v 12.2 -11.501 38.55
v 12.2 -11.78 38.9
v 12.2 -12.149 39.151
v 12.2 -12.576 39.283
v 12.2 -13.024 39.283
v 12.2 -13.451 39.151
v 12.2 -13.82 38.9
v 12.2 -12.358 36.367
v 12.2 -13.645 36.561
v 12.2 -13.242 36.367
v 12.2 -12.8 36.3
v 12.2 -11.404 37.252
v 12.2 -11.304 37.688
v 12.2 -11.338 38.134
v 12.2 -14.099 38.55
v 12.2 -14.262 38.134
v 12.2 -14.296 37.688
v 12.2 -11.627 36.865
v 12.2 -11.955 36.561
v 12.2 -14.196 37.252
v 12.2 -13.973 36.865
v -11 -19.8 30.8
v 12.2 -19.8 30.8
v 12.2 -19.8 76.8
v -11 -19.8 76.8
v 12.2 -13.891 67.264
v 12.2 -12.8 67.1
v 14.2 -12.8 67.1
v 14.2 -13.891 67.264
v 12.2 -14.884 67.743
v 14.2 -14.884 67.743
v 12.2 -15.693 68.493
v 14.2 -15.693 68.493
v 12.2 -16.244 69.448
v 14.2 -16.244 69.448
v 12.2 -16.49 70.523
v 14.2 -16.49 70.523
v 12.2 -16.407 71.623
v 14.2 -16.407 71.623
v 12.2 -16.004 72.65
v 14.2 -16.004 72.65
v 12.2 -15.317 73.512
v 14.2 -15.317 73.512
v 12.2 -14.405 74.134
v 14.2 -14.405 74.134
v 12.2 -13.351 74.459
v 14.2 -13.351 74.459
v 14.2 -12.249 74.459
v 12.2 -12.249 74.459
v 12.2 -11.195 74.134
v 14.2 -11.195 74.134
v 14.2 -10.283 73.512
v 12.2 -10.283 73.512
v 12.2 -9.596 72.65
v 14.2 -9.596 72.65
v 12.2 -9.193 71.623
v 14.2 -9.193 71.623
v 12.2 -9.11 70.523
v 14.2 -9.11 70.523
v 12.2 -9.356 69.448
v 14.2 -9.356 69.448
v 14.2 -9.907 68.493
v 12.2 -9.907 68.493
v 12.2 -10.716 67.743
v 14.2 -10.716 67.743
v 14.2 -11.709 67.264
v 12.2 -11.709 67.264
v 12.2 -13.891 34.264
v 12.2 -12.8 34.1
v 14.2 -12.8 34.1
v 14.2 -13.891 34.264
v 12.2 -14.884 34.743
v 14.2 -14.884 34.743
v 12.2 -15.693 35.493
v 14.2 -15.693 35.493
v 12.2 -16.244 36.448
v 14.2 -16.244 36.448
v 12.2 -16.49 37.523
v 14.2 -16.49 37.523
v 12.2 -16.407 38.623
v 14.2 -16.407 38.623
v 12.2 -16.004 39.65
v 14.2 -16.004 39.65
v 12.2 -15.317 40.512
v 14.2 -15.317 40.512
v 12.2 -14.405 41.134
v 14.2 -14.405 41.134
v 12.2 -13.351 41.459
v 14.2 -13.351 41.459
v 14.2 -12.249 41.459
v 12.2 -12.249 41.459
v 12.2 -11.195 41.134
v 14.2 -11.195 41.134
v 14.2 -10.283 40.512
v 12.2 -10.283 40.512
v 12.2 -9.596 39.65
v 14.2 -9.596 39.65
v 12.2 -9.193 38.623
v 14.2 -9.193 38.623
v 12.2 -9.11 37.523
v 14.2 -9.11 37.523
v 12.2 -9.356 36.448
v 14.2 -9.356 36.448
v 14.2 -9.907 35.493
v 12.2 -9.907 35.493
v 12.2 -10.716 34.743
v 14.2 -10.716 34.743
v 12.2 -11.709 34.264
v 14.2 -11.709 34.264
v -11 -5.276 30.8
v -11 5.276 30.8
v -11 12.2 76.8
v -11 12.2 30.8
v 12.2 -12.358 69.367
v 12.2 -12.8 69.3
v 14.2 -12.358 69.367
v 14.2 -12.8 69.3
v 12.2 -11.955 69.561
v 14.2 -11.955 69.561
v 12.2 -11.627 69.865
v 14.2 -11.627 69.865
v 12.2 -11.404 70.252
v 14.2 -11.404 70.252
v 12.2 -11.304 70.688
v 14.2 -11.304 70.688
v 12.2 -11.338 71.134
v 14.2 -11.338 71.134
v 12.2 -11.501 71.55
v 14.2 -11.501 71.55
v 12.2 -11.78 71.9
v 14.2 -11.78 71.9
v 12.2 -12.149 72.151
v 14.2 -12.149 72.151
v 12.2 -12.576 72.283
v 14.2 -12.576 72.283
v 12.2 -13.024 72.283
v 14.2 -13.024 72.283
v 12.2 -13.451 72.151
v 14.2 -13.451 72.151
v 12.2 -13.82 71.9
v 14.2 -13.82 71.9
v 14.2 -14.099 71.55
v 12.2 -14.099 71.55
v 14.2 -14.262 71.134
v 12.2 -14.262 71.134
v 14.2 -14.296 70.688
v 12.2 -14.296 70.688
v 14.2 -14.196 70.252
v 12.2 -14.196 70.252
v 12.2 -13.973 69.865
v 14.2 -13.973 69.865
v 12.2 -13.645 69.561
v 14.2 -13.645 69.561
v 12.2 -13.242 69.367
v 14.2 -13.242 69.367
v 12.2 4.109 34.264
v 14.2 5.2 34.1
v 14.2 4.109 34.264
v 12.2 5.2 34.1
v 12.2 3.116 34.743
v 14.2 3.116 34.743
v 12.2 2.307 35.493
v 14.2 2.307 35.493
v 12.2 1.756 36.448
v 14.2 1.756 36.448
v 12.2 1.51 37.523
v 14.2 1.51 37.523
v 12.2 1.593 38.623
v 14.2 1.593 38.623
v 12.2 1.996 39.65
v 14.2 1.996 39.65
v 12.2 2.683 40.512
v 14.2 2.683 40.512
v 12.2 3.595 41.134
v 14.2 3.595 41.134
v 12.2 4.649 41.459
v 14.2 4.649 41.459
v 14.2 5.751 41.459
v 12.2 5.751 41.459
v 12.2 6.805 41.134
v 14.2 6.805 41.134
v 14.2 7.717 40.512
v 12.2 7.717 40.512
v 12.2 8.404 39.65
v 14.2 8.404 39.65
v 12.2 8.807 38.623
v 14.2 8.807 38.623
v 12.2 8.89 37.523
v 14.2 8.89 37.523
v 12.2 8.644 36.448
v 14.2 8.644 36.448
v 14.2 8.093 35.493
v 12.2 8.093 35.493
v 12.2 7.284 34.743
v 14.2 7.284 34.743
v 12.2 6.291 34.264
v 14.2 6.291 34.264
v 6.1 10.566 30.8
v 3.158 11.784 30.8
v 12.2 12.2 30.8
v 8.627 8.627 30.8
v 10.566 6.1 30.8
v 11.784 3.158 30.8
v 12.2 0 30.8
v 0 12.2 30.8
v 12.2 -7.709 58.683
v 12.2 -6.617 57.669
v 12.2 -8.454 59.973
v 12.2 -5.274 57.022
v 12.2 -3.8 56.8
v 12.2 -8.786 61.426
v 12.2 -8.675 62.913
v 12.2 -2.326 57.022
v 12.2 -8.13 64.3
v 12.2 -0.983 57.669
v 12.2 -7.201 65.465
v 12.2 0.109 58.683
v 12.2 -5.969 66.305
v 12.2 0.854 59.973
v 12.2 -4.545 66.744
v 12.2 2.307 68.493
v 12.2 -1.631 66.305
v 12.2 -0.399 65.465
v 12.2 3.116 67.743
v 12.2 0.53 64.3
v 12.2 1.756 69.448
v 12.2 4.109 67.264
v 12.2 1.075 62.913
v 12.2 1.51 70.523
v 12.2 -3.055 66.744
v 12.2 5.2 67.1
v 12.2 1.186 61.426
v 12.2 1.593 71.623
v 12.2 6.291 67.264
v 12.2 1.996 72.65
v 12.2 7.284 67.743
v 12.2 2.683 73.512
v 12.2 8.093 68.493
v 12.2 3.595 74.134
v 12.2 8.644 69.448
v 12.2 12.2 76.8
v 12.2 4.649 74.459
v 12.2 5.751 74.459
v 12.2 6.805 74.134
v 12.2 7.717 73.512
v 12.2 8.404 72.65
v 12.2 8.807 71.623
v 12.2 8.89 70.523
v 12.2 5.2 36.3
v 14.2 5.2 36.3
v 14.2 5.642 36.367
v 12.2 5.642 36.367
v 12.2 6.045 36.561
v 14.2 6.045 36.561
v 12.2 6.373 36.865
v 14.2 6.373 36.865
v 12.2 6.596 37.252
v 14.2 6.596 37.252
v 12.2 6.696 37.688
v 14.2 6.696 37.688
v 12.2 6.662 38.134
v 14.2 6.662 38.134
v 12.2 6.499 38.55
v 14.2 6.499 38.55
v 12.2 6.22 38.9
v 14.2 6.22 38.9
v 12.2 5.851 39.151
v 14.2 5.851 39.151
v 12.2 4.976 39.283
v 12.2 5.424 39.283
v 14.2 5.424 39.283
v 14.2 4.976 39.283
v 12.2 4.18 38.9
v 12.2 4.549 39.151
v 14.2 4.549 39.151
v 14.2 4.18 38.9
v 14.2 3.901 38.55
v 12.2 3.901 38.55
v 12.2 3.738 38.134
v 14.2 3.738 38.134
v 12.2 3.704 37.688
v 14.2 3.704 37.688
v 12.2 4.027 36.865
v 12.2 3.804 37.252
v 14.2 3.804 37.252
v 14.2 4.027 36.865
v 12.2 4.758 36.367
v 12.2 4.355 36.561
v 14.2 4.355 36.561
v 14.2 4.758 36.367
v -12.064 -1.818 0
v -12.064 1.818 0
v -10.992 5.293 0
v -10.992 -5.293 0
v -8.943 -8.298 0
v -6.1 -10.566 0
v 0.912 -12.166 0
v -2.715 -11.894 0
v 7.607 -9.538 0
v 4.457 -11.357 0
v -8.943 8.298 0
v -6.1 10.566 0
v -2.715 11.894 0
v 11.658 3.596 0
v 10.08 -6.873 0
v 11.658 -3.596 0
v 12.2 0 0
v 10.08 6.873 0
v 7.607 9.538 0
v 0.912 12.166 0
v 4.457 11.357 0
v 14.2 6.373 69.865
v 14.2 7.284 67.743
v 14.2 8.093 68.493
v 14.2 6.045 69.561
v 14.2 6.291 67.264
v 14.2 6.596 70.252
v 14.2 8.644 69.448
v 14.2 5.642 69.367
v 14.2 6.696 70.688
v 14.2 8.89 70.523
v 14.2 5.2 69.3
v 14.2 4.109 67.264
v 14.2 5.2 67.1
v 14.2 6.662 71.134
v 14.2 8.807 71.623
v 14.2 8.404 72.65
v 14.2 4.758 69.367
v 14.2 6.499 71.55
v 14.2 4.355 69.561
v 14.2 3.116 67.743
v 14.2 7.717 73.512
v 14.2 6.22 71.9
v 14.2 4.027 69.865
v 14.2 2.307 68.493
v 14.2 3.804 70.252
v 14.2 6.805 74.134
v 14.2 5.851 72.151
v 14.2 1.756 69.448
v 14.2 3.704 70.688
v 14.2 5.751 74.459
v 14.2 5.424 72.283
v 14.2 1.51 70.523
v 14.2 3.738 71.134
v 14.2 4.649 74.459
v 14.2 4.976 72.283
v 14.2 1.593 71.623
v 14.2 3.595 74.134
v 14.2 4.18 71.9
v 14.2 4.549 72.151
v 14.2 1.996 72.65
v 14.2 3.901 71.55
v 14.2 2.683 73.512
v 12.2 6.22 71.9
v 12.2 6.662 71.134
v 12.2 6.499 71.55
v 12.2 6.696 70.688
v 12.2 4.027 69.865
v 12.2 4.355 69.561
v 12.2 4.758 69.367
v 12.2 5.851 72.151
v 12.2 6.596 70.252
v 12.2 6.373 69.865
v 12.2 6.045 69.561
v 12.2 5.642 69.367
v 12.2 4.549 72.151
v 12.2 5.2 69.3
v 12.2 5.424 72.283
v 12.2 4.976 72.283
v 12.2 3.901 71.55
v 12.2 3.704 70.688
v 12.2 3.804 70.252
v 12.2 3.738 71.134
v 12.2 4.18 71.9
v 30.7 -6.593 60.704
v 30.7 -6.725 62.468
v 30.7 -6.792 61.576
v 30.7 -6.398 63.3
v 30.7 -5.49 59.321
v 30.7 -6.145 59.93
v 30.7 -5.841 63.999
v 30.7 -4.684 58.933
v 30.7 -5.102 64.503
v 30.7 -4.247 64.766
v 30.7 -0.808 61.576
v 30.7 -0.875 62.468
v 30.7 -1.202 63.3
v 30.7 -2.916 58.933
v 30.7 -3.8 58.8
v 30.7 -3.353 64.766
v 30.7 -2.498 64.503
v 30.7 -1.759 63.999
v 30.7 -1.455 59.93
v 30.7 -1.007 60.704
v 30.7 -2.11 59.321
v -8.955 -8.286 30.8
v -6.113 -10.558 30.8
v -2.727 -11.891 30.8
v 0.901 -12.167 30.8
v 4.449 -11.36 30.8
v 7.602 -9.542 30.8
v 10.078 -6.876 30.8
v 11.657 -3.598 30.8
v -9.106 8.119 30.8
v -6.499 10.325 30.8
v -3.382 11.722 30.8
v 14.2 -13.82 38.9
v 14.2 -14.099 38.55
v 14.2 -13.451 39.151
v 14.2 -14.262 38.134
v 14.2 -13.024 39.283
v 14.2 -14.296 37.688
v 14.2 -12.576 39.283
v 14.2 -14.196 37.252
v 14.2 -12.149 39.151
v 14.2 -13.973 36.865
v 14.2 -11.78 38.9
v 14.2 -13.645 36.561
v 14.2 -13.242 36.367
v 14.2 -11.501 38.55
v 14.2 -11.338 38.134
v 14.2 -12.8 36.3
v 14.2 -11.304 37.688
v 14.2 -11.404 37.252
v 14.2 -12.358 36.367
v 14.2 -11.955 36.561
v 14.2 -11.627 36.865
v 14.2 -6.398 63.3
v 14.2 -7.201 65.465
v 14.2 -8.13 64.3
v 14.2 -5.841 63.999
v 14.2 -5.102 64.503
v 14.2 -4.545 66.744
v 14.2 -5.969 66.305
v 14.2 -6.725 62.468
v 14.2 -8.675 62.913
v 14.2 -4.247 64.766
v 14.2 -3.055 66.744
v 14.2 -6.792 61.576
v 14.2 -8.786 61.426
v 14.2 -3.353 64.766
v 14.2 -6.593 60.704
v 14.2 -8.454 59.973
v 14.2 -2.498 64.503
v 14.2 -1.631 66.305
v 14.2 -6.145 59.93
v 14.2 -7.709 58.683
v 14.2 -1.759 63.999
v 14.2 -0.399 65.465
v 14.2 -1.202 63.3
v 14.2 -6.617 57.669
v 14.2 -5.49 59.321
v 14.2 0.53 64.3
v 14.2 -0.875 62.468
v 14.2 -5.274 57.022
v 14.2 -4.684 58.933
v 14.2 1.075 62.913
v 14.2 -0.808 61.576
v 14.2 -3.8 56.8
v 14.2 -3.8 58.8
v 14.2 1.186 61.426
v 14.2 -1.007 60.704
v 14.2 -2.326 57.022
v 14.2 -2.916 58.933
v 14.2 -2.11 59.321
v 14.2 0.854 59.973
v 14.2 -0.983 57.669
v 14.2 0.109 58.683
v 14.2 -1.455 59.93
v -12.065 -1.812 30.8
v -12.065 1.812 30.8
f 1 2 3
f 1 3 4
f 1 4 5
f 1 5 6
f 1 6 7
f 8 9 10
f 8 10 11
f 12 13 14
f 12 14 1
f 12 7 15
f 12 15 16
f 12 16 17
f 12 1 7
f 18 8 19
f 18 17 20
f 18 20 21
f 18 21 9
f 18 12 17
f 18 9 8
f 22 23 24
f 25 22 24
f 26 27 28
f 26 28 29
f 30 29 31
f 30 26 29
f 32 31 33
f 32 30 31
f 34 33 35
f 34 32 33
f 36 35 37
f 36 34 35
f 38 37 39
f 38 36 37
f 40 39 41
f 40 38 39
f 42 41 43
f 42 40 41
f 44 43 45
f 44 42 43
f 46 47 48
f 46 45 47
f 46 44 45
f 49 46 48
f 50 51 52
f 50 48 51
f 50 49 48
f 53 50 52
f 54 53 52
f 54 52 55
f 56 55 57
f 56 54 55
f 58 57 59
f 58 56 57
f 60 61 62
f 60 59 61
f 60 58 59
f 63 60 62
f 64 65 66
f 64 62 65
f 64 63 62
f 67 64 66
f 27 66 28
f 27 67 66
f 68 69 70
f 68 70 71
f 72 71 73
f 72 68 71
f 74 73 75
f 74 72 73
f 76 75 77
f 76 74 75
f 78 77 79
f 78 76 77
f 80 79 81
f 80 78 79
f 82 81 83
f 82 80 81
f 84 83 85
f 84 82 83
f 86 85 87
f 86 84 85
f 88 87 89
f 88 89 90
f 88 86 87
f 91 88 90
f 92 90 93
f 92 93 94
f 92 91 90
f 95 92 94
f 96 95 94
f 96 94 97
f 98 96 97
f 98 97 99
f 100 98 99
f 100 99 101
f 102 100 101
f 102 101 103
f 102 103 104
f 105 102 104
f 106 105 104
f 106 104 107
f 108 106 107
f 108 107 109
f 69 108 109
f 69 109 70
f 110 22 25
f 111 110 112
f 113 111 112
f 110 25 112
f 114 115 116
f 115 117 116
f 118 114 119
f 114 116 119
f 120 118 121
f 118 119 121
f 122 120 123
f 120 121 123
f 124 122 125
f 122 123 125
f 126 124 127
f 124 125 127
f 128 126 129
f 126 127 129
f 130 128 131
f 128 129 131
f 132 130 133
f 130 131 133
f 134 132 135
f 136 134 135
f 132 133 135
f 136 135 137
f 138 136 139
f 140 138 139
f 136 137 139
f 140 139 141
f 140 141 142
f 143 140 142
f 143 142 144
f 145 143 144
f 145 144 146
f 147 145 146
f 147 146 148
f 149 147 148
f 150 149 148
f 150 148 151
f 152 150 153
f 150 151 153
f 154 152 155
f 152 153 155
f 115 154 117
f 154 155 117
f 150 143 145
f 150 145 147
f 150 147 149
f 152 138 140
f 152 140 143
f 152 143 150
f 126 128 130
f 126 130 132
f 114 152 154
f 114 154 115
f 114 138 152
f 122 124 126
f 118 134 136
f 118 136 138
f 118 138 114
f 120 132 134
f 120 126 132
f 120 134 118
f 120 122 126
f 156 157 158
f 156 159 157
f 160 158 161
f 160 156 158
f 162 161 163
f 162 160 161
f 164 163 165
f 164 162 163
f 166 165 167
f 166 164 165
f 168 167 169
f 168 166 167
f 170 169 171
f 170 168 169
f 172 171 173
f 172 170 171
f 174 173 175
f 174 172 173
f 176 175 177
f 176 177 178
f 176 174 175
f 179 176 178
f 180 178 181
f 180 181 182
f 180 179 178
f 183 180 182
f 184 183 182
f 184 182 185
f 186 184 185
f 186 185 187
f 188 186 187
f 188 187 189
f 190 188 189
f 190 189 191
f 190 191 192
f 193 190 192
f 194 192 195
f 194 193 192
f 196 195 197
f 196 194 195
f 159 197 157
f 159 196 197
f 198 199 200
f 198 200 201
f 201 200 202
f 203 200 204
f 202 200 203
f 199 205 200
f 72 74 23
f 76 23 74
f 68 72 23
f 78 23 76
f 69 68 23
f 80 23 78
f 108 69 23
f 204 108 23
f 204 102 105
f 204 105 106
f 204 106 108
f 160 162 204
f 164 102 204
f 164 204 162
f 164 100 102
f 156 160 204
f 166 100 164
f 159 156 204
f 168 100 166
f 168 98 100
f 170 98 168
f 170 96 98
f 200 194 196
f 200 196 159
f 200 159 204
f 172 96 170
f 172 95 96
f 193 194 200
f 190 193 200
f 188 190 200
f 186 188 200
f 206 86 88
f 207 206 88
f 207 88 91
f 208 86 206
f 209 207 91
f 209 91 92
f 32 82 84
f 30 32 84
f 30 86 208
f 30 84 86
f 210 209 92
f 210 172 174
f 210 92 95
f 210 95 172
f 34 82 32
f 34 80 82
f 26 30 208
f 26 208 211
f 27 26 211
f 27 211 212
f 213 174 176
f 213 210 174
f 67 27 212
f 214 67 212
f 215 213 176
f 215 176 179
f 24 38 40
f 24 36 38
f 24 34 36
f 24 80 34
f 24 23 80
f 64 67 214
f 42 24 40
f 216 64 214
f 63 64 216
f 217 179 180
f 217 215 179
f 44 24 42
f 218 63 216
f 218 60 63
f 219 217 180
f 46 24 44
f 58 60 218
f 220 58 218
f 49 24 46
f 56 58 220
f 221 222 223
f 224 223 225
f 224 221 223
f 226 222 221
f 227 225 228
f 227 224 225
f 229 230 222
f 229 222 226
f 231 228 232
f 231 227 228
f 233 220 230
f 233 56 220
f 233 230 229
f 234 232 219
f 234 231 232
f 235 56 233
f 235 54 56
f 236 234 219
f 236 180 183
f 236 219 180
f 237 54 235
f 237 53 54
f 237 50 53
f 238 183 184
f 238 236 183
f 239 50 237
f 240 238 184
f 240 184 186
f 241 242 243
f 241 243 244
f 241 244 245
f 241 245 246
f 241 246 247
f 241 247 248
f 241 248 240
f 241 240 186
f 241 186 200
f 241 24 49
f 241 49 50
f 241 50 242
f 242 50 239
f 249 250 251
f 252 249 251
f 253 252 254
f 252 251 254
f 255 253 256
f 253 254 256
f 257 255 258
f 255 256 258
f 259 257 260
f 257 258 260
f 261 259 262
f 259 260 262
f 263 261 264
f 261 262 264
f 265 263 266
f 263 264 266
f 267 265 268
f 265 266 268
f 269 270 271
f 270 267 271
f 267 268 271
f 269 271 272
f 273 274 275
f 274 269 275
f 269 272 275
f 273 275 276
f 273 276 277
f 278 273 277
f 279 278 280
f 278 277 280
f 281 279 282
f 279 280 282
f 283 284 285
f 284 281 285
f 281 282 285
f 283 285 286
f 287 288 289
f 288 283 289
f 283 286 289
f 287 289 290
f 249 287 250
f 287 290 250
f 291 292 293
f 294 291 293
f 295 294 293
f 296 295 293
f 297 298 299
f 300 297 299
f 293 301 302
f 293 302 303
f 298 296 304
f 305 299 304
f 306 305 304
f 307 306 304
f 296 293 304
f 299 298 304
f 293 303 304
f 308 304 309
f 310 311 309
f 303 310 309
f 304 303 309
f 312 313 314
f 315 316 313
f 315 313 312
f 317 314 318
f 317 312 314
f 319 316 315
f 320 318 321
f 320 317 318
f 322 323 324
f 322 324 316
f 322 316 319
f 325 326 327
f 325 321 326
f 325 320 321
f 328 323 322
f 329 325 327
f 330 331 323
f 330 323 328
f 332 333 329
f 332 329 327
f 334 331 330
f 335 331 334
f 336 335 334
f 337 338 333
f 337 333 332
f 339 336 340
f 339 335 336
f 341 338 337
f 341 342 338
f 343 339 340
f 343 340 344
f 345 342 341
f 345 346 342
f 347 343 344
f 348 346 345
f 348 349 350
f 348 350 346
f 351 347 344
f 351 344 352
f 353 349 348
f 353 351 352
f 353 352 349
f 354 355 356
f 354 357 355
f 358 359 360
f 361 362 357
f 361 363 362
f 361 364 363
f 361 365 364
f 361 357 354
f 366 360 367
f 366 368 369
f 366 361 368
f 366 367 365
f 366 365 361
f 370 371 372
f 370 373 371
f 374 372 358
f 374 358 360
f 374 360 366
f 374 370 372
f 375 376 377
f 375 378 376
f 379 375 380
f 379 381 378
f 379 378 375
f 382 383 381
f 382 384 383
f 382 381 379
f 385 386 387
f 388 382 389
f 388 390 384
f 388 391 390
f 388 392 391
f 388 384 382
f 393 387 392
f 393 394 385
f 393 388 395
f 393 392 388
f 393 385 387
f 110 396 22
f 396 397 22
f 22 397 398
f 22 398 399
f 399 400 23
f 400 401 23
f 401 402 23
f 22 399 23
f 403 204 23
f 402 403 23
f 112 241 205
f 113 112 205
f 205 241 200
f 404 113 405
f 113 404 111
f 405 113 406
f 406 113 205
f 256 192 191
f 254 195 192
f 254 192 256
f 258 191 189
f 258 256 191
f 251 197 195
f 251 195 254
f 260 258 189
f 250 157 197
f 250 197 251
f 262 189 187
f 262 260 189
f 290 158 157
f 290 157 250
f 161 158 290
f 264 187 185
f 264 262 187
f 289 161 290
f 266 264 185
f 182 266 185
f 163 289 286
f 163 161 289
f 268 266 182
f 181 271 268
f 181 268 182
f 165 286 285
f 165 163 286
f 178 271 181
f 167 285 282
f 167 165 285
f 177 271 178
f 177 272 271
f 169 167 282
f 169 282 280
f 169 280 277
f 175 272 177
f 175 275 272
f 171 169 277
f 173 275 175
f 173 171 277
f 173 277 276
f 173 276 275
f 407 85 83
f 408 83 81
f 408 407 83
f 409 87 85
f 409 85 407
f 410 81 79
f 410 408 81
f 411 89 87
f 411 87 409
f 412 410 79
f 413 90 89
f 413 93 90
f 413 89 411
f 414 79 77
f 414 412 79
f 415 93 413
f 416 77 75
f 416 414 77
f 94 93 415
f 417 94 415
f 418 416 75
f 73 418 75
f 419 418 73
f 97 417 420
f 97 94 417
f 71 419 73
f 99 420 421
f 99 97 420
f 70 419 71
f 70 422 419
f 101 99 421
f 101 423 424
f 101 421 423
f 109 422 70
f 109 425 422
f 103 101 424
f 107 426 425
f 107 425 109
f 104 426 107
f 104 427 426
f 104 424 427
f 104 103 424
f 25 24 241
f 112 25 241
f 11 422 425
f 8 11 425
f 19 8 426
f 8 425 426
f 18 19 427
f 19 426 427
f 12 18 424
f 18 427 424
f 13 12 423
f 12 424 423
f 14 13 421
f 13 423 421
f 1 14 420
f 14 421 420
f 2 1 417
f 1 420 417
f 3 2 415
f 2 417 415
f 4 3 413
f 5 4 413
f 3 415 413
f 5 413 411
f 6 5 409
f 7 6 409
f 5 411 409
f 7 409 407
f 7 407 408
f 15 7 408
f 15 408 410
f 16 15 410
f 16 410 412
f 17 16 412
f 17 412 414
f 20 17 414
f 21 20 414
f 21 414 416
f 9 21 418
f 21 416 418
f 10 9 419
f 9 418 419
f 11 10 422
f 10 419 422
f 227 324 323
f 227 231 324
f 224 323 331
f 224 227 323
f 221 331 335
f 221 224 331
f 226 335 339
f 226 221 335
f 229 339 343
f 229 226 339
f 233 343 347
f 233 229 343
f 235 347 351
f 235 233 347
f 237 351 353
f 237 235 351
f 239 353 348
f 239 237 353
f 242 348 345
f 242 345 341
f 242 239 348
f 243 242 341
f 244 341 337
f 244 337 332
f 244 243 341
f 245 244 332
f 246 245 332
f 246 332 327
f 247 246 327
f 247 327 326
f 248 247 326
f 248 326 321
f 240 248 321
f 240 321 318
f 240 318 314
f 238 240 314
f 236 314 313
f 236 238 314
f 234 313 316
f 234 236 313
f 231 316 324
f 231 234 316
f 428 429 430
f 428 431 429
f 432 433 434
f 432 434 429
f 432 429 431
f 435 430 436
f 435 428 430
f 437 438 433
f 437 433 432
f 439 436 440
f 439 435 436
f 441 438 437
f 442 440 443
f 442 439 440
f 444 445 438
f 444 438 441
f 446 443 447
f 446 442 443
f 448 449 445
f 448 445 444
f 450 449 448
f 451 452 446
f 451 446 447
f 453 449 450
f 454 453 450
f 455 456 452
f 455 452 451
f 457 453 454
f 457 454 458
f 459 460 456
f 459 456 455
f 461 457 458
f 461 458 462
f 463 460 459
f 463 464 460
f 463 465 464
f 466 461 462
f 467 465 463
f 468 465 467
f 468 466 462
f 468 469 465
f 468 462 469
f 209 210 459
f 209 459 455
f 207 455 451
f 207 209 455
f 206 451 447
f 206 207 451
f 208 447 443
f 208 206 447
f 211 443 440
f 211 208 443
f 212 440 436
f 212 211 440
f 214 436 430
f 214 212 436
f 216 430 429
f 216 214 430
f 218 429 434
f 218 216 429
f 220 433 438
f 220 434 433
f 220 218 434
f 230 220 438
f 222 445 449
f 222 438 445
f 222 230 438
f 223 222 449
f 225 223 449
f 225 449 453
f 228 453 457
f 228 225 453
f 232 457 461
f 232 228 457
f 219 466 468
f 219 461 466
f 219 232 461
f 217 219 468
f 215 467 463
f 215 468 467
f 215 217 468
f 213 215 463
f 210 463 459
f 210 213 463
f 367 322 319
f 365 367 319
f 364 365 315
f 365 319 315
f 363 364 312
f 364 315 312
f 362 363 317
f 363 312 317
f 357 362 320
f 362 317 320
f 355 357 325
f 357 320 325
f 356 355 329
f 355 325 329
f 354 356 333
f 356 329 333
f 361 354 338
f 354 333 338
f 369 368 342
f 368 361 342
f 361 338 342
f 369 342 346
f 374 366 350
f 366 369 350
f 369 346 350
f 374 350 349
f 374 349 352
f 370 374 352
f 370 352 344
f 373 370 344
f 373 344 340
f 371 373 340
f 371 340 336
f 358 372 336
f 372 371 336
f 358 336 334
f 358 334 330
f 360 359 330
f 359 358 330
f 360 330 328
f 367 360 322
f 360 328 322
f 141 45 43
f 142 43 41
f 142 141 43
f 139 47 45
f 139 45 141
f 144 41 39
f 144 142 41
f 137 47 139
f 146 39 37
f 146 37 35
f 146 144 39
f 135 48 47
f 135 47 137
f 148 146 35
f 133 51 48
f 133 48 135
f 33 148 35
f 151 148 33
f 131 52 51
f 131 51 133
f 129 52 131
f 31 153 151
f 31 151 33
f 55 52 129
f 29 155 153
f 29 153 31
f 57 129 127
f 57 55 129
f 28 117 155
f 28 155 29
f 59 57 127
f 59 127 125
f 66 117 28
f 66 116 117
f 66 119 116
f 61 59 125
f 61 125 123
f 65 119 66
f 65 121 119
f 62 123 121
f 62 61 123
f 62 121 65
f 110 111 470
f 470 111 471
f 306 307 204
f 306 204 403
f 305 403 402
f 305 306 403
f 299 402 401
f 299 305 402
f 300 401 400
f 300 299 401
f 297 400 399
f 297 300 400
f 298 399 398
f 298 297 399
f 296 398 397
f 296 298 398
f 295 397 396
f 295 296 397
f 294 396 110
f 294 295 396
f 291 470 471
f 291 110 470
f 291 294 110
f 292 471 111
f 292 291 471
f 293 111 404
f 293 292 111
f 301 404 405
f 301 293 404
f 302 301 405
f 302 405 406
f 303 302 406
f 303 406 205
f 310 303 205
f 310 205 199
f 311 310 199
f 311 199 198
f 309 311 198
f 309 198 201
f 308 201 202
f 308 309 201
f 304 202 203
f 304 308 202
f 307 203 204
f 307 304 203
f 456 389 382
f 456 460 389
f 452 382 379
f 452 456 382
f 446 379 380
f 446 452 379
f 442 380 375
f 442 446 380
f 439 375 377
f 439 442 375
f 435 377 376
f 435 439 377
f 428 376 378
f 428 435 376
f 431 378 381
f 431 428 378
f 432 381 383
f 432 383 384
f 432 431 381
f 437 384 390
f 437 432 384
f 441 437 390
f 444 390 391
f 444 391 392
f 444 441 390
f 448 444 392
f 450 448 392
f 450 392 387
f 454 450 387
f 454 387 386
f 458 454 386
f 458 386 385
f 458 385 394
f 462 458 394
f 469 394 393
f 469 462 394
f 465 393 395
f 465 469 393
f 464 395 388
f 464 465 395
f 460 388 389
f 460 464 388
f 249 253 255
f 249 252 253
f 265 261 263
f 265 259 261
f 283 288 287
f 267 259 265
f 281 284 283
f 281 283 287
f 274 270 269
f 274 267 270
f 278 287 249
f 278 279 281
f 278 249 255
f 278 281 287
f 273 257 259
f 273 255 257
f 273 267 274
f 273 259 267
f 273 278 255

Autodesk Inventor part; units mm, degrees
ref_plane "XZ Plane" through (0, 0, 0) normal (0, 1, 0) x (-1, 0, 0)
sketch "Эскиз1" plane through (0, 0, 0) normal (0, 0, 1) x (1, 0, 0)
  circle A0 centre (0, 0) radius 12.2
  dimension "d0" = 24.4
extrude "Выдавливание1" add sketch "Эскиз1" along normal blind 30.8
ref_plane "РабПлоскость1" through (12.2, 0, 0) normal (1, 0, 0) x (0, 1, 0)
sketch "Эскиз2" plane through (12.2, 0, 0) normal (1, 0, 0) x (0, 1, 0)
  line L0 (12.2, 0) -> (12.2, 30.8) projected
  line L1 (12.2, 30.8) -> (-19.8, 30.8)
  line L2 (-19.8, 30.8) -> (-19.8, 76.8)
  line L3 (-19.8, 76.8) -> (12.2, 76.8)
  line L4 (12.2, 76.8) -> (12.2, 30.8)
  point P0 (0, 0)
  dimension "d3" = 46
  dimension "d4" = 32
extrude "Выдавливание2" add sketch "Эскиз2" against normal blind 23.2
sketch "Эскиз3" plane through (12.2, 0, 0) normal (1, 0, 0) x (0, 0, -1)
  circle A0 centre (-70.8, -12.8) radius 3.7
  line L0 (0, 0) -> (0, -12.8)
  line L1 (0, -12.8) -> (-70.8, -12.8)
  point P0 (-76.8, -19.8)
  dimension "d10" = 7.4
  dimension "d11" = 12.8
  dimension "d12" = 70.8
extrude "Выдавливание3" add sketch "Эскиз3" along normal blind 2
ref_plane "РабПлоскость2" through (12.2, -3.8, 30.8) normal (0, -1, 0) x (1, 0, 0)
mirror "Зеркальное отражение1" about plane through (12.2, -3.8, 30.8) normal (0, -1, 0) of "Выдавливание3"
sketch "Эскиз4" plane through (12.2, 0, 0) normal (1, 0, 0) x (0, 0, -1)
  line L0 (-30.8, -5.2764) -> (-30.8, -19.8) projected
  line L1 (-30.8, -19.8) -> (-37.8, -19.8)
  line L2 (-30.8, -19.8) -> (-76.8, -19.8) projected
  line L3 (-37.8, -19.8) -> (-37.8, -12.8)
  circle A0 centre (-37.8, -12.8) radius 3.7
  point P0 (0, 0)
  dimension "d15" = 7
  dimension "d16" = 7
  dimension "d17" = 7.4
extrude "Выдавливание4" add sketch "Эскиз4" along normal blind 2
mirror "Зеркальное отражение2" about plane through (12.2, -3.8, 30.8) normal (0, -1, 0) of "Выдавливание4"
sketch "Эскиз5" plane through (12.2, 0, 0) normal (1, 0, 0) x (0, 0, -1)
  circle A0 centre (-70.8, -12.8) radius 3.7 projected
  circle A1 centre (-70.8, 5.2) radius 3.7 projected
  line L0 (-76.8, -19.8) -> (-61.8, -19.8)
  line L1 (-61.8, -19.8) -> (-61.8, -3.8)
  circle A2 centre (-61.8, -3.8) radius 3
  point P0 (0, 0)
  dimension "d20" = 15
  dimension "d21" = 16
  dimension "d22" = 6
extrude "Выдавливание5" add sketch "Эскиз5" along normal blind 18.5 contours A2
sketch "Эскиз6" plane through (14.2, -12.8, 70.8) normal (1, 0, 0) x (0, 0, -1)
  circle A0 centre (0, 0) radius 3.7 projected
  circle A1 centre (0, 0) radius 1.5
  point P0 (70.8, 12.8)
  dimension "d25" = 3
extrude "Выдавливание6" cut sketch "Эскиз6" against normal blind 2 contours A1
mirror "Зеркальное отражение3" about plane through (12.2, -3.8, 30.8) normal (0, -1, 0) of "Выдавливание6"
sketch "Эскиз8" plane through (14.2, -12.8, 37.8) normal (1, 0, 0) x (0, 0, -1)
  circle A0 centre (0, 0) radius 3.7 projected
  circle A1 centre (0, 0) radius 1.5
  point P0 (37.8, 12.8)
  dimension "d28" = 3
extrude "Выдавливание7" cut sketch "Эскиз8" against normal blind 2 contours A1
mirror "Зеркальное отражение4" about plane through (12.2, -3.8, 30.8) normal (0, -1, 0) of "Выдавливание7"
sketch "Эскиз9" plane through (12.2, 0, 0) normal (1, 0, 0) x (0, 0, -1)
  circle A0 centre (-61.8, -3.8) radius 3 projected
  circle A1 centre (-61.8, -3.8) radius 5
  point P0 (0, 0)
  dimension "d31" = 10
extrude "Выдавливание8" add sketch "Эскиз9" along normal blind 2
properties part number "Мотор"
